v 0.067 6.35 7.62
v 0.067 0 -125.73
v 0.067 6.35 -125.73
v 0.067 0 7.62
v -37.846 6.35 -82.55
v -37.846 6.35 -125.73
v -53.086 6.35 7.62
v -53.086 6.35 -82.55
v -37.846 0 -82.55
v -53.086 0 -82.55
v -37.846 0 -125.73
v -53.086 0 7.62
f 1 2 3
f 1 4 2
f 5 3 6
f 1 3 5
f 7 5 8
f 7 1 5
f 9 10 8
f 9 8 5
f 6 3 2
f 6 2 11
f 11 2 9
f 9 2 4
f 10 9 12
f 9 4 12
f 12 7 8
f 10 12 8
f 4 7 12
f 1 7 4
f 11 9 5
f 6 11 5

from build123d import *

# Parameters (mm, degrees)
SKETCH1_W           = 53.594
SKETCH1_H           = 82.55
BOSS_EXTRUDE1_DEPTH = 6.35
SKETCH6_W           = 53.594
SKETCH6_H           = 6.35
BOSS_EXTRUDE3_DEPTH = 7.62
SKETCH3_W           = 0.508
SKETCH3_H           = 90.17
CUT_EXTRUDE2_DEPTH  = 6.35
SKETCH8_W           = 37.338
SKETCH8_H           = 6.35
BOSS_EXTRUDE4_DEPTH = 43.18
SKETCH10_W          = 53.153164817
SKETCH10_H          = 6.35
BOSS_EXTRUDE5_DEPTH = 90.17
SKETCH11_W          = 0.575164817
SKETCH11_H          = 6.35
BOSS_EXTRUDE6_DEPTH = 43.18


with BuildPart() as part:
    # Sketch1 → Boss-Extrude1 (new body)
    with BuildSketch(Plane(origin=(0, 0, 0), x_dir=(1, 0, 0), z_dir=(0, 1, 0))):
        with Locations((-26.797, 41.275)):
            Rectangle(SKETCH1_W, SKETCH1_H)
    extrude(amount=BOSS_EXTRUDE1_DEPTH)

    # Sketch6 → Boss-Extrude3 (add)
    with BuildSketch(Plane.XY):
        with Locations((-26.797, 3.175)):
            Rectangle(SKETCH6_W, SKETCH6_H)
    extrude(amount=BOSS_EXTRUDE3_DEPTH)

    # Sketch3 → Cut-Extrude2 (cut)
    with BuildSketch(Plane(origin=(0, 6.35, 0), x_dir=(1, 0, 0), z_dir=(0, 1, 0))):
        with Locations((-0.254, 37.465)):
            Rectangle(SKETCH3_W, SKETCH3_H)
    cut_extrude2 = extrude(amount=-CUT_EXTRUDE2_DEPTH, mode=Mode.SUBTRACT)

    # Mirror1: Cut-Extrude2 across plane
    add(cut_extrude2.mirror(Plane(origin=(-26.797, 0, 0), x_dir=(0, 0, 1), z_dir=(1, 0, 0))), mode=Mode.SUBTRACT)

    # Sketch8 → Boss-Extrude4 (add)
    with BuildSketch(Plane(origin=(0, 0, -82.55), x_dir=(-1, 0, 0), z_dir=(0, 0, -1))):
        with Locations((19.177, 3.175)):
            Rectangle(SKETCH8_W, SKETCH8_H)
    extrude(amount=BOSS_EXTRUDE4_DEPTH)

    # Sketch10 → Boss-Extrude5 (add)
    with BuildSketch(Plane.XY.offset(7.62)):
        with Locations((-26.509417592, 3.175)):
            Rectangle(SKETCH10_W, SKETCH10_H)
    extrude(amount=-BOSS_EXTRUDE5_DEPTH)

    # Sketch11 → Boss-Extrude6 (add)
    with BuildSketch(Plane(origin=(0, 0, -82.55), x_dir=(-1, 0, 0), z_dir=(0, 0, -1))):
        with Locations((0.220417592, 3.175)):
            Rectangle(SKETCH11_W, SKETCH11_H)
    extrude(amount=BOSS_EXTRUDE6_DEPTH)


solid = part.part
